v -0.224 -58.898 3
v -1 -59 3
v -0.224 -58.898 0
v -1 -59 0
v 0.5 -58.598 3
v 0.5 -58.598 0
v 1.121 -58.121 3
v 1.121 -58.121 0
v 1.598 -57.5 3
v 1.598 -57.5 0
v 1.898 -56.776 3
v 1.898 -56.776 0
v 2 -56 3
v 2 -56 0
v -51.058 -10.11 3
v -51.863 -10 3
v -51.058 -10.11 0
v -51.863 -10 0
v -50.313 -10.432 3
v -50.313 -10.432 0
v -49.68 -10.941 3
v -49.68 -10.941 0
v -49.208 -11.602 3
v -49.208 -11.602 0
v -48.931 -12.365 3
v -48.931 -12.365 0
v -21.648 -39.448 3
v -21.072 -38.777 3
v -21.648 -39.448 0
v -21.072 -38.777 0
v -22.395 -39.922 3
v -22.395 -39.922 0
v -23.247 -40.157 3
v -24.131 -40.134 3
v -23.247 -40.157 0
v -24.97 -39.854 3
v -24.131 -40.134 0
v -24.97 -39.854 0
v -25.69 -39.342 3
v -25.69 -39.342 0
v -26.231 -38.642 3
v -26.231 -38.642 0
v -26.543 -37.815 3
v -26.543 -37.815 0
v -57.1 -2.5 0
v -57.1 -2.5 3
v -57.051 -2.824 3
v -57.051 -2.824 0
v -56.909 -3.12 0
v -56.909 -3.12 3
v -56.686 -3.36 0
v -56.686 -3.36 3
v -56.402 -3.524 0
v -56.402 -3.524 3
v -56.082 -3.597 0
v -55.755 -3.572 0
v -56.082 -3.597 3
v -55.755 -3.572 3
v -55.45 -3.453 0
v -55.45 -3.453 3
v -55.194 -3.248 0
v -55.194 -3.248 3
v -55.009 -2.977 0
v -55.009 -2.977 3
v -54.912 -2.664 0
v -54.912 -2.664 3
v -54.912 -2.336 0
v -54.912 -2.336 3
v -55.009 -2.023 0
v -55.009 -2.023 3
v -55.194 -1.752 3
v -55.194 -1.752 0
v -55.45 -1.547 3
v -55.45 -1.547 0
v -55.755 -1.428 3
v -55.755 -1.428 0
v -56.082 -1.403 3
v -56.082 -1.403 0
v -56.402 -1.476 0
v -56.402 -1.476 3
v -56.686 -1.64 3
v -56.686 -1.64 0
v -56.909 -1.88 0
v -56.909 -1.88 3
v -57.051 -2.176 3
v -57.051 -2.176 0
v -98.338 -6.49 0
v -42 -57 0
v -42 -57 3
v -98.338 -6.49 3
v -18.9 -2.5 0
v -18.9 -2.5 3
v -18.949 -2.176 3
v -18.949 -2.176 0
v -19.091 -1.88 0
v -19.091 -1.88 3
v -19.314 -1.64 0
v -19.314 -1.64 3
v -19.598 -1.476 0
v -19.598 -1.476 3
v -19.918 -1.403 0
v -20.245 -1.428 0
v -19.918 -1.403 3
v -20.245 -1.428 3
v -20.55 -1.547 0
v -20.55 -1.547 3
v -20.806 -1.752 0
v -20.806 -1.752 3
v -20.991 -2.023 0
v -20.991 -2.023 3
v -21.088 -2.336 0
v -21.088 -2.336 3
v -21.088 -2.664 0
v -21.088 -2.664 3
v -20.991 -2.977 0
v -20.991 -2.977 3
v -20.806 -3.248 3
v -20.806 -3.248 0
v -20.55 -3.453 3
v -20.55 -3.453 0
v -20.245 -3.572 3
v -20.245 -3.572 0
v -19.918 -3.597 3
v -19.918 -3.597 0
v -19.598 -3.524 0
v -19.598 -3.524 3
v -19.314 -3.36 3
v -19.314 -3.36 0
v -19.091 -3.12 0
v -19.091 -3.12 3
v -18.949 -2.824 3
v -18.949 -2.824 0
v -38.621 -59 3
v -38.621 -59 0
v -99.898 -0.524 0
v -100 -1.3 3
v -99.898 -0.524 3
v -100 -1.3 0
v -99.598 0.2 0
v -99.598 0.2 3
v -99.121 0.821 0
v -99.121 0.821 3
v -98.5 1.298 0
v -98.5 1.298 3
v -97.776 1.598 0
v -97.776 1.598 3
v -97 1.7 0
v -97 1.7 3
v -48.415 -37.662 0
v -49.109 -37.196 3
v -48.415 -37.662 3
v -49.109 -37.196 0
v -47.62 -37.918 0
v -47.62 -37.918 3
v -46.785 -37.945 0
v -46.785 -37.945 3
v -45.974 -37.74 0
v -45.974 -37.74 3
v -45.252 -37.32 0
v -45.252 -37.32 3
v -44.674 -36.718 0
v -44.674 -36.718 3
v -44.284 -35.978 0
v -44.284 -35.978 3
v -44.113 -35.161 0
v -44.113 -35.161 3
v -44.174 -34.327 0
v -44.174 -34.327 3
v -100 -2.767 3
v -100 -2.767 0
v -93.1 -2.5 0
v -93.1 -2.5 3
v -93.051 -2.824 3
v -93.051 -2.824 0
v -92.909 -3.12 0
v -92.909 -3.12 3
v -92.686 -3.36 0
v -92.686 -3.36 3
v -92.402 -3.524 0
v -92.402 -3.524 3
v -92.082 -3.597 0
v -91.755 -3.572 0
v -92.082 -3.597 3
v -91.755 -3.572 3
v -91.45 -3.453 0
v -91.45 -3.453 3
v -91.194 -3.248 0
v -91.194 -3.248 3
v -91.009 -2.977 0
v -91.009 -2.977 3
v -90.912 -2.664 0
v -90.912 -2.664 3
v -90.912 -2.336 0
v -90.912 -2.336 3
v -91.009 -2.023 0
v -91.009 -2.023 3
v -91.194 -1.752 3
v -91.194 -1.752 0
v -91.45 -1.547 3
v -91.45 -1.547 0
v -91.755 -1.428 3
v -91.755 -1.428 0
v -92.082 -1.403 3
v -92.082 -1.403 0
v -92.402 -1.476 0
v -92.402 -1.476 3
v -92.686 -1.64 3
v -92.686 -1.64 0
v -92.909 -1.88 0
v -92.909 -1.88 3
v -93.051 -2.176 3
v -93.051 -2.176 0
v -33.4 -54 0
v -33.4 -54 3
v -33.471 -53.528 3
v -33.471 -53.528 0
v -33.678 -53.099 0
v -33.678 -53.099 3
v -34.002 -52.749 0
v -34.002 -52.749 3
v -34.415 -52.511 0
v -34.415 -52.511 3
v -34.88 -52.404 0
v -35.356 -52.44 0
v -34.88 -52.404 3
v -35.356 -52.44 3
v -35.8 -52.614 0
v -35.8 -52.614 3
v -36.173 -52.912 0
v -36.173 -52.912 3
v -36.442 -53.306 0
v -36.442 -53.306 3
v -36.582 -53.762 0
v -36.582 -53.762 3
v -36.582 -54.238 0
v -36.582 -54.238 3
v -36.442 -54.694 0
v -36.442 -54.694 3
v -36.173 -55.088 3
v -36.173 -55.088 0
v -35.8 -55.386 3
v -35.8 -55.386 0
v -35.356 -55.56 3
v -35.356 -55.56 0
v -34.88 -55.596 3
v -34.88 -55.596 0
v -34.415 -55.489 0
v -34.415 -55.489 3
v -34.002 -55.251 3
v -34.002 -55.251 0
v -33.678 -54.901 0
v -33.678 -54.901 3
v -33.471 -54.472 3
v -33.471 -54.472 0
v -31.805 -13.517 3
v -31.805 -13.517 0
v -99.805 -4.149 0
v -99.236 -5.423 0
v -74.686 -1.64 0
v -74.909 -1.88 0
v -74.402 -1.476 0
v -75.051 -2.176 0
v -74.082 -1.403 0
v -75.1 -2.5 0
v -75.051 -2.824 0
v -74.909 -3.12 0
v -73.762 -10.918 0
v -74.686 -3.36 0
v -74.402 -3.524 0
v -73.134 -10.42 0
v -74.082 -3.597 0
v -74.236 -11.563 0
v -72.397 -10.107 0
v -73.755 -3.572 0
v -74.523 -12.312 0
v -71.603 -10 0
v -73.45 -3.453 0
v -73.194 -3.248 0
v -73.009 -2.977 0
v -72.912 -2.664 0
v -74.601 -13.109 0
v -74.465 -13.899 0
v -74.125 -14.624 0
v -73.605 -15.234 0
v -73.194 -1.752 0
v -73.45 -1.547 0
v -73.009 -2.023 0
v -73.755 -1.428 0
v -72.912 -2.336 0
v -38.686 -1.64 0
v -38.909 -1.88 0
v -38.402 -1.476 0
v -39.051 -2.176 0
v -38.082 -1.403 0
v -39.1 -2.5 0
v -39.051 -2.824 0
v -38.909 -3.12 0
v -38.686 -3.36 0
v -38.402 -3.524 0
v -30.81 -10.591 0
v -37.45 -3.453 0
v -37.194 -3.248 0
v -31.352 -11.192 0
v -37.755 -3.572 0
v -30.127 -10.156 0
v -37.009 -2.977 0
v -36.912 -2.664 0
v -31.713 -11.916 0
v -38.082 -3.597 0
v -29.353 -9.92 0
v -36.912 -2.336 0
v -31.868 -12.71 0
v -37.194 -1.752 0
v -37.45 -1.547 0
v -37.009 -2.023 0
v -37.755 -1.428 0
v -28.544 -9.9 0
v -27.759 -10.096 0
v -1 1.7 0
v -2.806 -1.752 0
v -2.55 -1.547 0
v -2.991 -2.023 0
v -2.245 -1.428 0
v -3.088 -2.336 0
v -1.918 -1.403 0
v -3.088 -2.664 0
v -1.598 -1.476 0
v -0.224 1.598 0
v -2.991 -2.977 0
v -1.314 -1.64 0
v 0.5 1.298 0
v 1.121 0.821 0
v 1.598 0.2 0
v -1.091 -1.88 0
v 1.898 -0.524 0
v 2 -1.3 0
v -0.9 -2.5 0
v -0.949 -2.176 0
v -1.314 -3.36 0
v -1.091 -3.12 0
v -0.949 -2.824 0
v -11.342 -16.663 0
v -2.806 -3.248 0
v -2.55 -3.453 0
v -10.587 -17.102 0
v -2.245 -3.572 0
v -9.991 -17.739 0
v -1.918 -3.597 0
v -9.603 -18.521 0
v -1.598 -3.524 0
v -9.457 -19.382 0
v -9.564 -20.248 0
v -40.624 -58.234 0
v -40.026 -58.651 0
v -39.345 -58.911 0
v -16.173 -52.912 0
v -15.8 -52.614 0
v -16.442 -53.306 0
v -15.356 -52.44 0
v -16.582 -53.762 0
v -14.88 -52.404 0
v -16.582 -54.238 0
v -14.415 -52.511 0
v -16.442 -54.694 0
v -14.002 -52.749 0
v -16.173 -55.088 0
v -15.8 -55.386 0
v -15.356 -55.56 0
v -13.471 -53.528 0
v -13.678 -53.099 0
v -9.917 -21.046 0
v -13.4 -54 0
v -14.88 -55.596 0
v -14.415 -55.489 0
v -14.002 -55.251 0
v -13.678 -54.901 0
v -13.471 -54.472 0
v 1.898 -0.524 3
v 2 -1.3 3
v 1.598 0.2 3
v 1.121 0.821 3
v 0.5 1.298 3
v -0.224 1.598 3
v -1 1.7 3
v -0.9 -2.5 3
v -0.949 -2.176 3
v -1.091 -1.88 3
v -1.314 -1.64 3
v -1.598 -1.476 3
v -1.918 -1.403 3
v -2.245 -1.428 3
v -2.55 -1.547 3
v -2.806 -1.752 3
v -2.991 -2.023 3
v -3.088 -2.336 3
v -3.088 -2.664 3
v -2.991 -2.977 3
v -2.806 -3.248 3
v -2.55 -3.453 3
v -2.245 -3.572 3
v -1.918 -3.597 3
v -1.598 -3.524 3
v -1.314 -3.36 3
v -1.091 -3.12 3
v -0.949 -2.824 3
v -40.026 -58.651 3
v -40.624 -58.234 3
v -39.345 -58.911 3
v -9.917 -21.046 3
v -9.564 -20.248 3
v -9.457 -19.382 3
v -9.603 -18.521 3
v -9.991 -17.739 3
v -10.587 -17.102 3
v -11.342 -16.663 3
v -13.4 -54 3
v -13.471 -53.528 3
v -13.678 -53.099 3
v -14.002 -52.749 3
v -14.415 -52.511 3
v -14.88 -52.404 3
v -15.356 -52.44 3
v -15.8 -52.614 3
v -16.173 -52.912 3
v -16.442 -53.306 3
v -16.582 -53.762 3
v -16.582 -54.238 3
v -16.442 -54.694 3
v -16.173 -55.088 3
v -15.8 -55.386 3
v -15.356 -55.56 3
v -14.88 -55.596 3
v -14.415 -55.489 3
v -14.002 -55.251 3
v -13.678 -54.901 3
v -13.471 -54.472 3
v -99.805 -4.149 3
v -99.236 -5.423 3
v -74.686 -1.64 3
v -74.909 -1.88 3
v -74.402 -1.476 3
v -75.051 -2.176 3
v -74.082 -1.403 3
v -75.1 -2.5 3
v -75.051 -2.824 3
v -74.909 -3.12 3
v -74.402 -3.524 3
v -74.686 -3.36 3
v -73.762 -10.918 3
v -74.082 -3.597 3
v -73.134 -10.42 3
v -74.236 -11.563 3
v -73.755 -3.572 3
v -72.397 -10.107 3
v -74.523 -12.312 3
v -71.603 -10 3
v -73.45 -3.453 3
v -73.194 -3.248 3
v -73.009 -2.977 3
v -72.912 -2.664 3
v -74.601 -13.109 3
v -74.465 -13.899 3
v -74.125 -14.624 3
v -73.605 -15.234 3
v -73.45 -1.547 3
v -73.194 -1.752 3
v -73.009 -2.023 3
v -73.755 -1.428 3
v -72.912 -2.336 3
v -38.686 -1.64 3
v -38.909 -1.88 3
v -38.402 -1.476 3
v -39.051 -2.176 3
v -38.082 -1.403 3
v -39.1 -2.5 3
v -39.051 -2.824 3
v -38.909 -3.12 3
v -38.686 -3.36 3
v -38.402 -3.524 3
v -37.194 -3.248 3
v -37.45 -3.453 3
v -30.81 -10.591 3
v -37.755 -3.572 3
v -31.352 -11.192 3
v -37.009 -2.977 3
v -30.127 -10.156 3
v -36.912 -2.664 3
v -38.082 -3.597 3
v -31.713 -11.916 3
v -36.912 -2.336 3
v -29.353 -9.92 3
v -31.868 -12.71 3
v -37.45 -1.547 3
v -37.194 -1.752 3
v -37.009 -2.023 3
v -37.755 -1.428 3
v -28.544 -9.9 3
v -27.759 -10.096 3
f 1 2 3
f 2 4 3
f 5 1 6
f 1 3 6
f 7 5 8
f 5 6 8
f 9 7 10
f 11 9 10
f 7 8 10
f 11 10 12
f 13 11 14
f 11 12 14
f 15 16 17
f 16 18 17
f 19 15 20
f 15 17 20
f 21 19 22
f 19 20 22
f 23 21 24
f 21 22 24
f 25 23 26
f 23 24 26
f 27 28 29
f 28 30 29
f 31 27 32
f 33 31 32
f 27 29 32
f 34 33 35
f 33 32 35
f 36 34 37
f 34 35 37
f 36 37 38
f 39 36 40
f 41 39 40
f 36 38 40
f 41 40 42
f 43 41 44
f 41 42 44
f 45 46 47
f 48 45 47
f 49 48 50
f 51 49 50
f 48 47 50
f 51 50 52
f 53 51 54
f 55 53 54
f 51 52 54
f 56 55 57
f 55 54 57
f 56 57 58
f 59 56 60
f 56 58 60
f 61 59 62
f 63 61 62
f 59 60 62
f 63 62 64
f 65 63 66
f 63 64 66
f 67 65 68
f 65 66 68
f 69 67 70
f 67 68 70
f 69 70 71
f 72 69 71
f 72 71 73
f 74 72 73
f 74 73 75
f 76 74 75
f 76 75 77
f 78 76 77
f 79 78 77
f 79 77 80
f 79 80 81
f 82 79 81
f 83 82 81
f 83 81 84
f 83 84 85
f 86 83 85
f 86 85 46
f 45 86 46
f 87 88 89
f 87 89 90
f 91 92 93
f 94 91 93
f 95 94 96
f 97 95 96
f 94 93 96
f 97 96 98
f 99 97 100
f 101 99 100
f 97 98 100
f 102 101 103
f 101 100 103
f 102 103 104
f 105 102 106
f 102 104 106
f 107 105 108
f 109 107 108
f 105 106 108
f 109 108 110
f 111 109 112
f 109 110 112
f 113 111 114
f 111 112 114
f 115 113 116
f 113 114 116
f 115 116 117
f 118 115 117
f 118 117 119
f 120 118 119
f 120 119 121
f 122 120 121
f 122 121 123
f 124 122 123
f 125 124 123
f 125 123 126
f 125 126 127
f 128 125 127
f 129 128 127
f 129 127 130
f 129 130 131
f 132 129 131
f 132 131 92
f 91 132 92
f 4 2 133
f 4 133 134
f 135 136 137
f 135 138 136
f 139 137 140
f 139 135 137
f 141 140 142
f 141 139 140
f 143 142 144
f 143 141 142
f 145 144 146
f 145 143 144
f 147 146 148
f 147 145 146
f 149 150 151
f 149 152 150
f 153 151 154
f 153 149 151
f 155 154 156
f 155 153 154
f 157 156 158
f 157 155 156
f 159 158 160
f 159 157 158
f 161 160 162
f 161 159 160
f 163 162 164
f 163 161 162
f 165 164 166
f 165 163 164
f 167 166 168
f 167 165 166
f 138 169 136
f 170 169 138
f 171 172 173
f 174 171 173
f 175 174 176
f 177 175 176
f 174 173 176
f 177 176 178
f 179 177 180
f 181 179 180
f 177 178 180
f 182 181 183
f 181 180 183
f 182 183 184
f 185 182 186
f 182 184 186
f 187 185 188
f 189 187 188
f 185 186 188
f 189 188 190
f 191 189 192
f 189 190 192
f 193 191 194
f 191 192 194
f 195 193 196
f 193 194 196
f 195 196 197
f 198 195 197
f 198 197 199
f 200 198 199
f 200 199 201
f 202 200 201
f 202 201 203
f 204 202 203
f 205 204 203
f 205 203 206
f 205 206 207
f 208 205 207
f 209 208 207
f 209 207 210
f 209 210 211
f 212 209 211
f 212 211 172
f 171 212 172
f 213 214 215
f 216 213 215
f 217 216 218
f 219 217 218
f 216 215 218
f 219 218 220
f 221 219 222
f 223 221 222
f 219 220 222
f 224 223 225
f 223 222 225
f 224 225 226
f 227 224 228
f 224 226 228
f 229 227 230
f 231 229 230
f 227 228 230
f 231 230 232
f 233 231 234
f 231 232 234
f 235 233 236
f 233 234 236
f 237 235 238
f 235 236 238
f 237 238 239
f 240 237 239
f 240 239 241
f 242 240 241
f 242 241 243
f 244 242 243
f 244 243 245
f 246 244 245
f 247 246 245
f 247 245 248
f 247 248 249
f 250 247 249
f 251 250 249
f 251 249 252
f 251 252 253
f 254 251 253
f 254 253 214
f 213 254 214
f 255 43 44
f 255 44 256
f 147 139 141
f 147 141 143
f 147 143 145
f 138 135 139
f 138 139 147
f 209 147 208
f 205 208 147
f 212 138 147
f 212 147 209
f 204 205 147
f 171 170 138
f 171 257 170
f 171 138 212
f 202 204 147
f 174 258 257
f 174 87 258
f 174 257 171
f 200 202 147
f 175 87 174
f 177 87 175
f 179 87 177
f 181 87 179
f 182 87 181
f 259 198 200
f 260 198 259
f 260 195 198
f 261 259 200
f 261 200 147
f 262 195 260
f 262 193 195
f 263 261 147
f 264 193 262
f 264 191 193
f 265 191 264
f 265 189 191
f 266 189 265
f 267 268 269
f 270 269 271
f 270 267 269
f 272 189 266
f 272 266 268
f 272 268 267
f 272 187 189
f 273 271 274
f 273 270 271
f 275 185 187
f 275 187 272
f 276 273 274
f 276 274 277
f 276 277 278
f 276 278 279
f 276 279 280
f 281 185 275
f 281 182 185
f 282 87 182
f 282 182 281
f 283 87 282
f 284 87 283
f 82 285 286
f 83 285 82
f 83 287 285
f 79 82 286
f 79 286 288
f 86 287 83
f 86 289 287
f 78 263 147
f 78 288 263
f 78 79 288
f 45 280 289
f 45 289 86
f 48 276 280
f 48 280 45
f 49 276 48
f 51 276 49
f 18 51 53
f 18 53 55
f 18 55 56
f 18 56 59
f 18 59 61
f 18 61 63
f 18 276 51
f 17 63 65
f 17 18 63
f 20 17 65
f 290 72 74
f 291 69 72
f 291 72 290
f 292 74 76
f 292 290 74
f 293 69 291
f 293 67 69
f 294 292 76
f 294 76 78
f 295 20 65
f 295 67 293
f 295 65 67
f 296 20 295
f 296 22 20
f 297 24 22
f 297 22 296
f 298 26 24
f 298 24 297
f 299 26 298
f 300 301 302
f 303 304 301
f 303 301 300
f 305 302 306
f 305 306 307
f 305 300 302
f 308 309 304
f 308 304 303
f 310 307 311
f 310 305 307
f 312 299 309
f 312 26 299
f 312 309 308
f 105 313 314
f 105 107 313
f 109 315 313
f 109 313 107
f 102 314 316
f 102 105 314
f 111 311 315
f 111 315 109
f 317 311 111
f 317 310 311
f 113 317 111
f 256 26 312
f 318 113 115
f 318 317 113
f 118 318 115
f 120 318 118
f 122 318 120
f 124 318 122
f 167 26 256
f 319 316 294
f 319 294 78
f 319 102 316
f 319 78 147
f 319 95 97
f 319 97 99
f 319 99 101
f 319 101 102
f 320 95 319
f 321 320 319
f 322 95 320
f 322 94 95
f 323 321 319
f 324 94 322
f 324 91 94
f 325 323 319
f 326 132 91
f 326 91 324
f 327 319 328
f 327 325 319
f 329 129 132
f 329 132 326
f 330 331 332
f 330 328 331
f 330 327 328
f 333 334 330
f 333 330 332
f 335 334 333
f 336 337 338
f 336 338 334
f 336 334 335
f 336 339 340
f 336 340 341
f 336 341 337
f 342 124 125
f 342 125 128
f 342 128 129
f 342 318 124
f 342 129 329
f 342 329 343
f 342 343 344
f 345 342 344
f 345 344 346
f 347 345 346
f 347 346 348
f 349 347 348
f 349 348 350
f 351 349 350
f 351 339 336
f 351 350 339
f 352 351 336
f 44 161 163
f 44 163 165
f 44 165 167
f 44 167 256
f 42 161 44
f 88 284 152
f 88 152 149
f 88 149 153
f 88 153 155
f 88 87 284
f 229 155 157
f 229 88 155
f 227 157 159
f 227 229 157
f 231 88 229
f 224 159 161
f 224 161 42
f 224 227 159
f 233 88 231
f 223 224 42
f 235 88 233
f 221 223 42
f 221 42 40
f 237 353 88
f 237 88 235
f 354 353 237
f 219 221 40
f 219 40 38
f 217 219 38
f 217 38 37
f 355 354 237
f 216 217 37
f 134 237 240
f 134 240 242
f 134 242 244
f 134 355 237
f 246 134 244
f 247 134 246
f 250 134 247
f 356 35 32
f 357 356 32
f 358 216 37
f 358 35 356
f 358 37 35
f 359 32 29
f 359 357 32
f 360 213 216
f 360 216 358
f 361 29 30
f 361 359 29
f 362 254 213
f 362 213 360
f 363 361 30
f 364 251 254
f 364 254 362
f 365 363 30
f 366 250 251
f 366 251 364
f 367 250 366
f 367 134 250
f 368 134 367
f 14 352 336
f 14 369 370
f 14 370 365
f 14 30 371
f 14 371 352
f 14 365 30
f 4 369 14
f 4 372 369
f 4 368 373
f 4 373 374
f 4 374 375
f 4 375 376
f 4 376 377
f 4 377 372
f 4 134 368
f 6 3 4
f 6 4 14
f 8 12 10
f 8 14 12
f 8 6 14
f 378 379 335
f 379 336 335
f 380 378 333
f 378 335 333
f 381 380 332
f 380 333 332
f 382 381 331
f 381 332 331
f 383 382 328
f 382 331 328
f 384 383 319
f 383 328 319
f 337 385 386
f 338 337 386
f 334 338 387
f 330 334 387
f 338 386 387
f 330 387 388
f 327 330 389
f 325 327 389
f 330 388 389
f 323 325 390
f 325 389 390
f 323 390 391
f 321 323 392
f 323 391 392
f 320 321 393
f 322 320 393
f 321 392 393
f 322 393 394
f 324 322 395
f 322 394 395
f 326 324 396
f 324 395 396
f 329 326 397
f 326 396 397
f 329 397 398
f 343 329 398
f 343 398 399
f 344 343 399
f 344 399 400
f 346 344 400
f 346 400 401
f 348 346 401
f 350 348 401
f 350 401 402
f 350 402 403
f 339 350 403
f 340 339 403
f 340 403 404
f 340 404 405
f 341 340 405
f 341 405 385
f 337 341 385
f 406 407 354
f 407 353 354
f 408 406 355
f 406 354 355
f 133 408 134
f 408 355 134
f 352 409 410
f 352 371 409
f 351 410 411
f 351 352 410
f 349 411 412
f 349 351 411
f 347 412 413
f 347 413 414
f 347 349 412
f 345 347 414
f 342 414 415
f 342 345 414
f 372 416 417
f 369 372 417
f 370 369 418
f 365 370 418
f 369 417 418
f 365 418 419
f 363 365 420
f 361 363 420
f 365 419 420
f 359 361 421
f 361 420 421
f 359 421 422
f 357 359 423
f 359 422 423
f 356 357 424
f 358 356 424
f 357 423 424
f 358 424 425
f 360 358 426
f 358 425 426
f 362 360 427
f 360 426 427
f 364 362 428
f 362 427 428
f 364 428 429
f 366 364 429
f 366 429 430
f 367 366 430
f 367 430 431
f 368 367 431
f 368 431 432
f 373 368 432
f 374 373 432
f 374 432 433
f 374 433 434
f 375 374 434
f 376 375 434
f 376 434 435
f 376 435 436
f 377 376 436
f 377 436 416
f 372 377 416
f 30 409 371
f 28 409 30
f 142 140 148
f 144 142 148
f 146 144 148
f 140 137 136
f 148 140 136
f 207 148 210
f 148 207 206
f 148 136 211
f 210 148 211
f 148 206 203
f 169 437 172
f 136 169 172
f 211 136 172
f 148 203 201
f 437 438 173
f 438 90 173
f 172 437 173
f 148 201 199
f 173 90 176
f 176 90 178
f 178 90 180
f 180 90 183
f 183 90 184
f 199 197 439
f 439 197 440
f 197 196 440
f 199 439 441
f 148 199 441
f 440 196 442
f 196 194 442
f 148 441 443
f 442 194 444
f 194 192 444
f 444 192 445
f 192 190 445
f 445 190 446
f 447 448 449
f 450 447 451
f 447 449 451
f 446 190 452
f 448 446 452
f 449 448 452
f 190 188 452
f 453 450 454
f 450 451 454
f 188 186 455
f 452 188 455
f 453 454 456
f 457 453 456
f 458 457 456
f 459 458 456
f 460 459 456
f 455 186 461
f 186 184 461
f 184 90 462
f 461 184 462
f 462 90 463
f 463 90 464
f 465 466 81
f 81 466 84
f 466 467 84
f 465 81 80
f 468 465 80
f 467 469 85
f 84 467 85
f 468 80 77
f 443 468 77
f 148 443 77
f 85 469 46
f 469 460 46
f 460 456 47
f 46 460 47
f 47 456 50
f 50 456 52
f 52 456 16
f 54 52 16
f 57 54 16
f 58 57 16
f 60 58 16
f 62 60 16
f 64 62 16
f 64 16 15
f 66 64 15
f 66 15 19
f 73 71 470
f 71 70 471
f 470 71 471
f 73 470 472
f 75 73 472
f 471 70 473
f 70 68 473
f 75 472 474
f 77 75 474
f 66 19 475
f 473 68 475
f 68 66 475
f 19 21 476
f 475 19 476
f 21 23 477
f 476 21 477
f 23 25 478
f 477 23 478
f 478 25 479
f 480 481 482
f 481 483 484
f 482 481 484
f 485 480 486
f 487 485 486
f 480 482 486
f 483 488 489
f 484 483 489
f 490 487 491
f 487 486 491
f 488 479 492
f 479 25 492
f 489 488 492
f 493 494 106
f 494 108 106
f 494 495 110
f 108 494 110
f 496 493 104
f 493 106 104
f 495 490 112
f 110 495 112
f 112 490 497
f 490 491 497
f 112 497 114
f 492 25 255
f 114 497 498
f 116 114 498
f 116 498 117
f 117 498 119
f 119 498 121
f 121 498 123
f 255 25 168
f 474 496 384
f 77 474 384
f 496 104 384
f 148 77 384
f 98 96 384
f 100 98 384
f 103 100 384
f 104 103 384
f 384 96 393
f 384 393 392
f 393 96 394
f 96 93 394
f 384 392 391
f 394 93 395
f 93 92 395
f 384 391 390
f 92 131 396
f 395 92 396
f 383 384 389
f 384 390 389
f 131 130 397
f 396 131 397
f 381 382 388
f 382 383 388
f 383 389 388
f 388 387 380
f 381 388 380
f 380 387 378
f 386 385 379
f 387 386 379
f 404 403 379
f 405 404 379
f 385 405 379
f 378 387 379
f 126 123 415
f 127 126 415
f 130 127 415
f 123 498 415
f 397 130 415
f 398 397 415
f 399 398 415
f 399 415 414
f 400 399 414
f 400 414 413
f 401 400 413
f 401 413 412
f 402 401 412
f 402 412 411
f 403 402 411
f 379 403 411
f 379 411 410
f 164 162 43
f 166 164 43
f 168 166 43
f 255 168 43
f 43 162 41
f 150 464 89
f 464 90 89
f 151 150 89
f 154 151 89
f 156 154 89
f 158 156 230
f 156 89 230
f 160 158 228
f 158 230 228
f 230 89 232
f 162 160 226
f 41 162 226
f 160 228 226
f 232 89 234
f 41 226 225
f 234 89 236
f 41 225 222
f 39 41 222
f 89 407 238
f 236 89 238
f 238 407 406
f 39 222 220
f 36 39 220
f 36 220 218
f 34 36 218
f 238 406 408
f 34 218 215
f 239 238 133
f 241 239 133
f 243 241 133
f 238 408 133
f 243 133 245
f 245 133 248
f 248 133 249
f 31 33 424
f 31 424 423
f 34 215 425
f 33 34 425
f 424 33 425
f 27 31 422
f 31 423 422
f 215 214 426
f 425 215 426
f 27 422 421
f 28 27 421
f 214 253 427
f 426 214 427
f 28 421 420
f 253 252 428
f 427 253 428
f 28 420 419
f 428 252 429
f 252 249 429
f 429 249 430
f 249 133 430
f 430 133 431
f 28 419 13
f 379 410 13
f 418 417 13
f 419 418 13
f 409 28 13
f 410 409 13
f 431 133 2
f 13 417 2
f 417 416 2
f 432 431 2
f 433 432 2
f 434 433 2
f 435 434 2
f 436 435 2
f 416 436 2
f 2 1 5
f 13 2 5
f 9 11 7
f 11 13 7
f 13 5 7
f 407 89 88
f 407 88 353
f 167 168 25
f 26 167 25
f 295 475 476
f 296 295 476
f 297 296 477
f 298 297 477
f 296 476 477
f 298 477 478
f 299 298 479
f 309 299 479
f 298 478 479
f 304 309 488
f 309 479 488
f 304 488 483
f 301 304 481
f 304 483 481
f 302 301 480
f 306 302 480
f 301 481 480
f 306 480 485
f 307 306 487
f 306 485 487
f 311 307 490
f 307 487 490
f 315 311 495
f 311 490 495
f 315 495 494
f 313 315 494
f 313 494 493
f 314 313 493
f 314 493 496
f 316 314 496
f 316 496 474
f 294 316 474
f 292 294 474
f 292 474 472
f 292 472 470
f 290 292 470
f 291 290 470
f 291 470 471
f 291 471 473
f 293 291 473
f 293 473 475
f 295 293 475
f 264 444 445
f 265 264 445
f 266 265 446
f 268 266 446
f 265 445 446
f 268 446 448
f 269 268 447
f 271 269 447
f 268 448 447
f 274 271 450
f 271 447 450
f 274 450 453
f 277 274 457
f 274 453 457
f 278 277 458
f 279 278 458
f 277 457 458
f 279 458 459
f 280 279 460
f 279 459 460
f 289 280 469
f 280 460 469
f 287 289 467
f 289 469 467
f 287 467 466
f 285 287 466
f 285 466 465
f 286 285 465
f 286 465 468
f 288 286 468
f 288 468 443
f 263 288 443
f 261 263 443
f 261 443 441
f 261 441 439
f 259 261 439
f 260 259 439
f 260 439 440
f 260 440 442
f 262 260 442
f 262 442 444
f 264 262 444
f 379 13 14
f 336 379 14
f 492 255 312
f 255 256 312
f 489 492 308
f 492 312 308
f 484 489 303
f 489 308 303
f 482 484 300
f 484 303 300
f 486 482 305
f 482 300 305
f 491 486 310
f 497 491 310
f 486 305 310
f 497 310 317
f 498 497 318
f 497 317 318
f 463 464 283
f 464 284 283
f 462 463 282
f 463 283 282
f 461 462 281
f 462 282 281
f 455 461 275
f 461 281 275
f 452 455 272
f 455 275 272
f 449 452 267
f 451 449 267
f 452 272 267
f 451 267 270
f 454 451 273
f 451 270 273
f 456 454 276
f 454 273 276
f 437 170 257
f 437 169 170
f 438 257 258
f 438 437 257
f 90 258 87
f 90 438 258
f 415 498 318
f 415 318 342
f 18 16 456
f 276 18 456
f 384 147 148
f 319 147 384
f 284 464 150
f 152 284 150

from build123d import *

# Parameters (mm, degrees)
EXTRUDE_1_DEPTH     = 3
SKETCH_2_R          = 1.1
SKETCH_2_R_2        = 1.025013192
SKETCH_2_R_3        = 1.6
CUT_EXTRUDE_2_DEPTH = 116.143388868
FILLET_1_R          = 5
SKETCH_3_R          = 1.6
SKETCH_3_R_2        = 1.1
EXTRUDE_2_DEPTH     = 3
CUT_EXTRUDE_3_DEPTH = 10
FILLET_2_R          = 3
EXTRUDE_3_DEPTH     = 3
SKETCH_6_W          = 3
SKETCH_6_H          = 59
EXTRUDE_4_DEPTH     = 2
SKETCH_7_W          = 102
SKETCH_7_H          = 3
EXTRUDE_5_DEPTH     = 1.7
FILLET_4_R          = 3


with BuildPart() as part:
    # 草图1 → 凸台-拉伸1 (new body)
    with BuildSketch(Plane.XY):
        Polygon((0, 0), (0, -57), (-42, -57), (-100, -5), (-100, 0), align=None)
    extrude(amount=EXTRUDE_1_DEPTH)

    # 草图2 → 切除-拉伸2 (cut, through all)
    with BuildSketch(Plane.XY.offset(3)):
        with Locations(Location((-38, -45, 0), (0, 0, 180))):
            Circle(SKETCH_2_R)
        with Locations(Location((-38, -14.5, 0), (0, 0, 180))):
            Circle(SKETCH_2_R)
        with Locations(Location((-38, -2.5, 0), (0, 0, 180))):
            Circle(SKETCH_2_R)
        with Locations(Location((-56, -2.5, 0), (0, 0, 180))):
            Circle(SKETCH_2_R)
        with Locations(Location((-74, -2.5, 0), (0, 0, 180))):
            Circle(SKETCH_2_R)
        with Locations(Location((-92, -2.5, 0), (0, 0, 180))):
            Circle(SKETCH_2_R)
        with Locations((-55.007781707, -42.651734732)):
            Circle(SKETCH_2_R_2)
        with Locations((-81.223203164, -24.300939713)):
            Circle(SKETCH_2_R_2)
        with Locations((-20, -2.5)):
            Circle(SKETCH_2_R)
        with Locations((-2, -2.5)):
            Circle(SKETCH_2_R)
        with Locations((-2, -14.5)):
            Circle(SKETCH_2_R)
        with Locations((-2, -45)):
            Circle(SKETCH_2_R)
        with Locations((-15, -54)):
            Circle(SKETCH_2_R_3)
        with Locations((-35, -54)):
            Circle(SKETCH_2_R_3)
    extrude(amount=-CUT_EXTRUDE_2_DEPTH, mode=Mode.SUBTRACT)

    # 圆角1
    fillet_1_edges = [part.edges().sort_by_distance(p)[0] for p in [
        (-100, -5, 1.5),
    ]]
    fillet(fillet_1_edges, radius=FILLET_1_R)

    # 草图3 → 凸台-拉伸2 (add)
    with BuildSketch(Plane.XY.offset(3)):
        with BuildLine():
            Line((-100, 0), (-100, -2.767468243))
            ThreePointArc((-100, -2.767468243), (-99.565557216, -4.806018538), (-98.337725079, -6.490315447))
            Line((-98.337725079, -6.490315447), (-42, -57))
            Line((-42, -57), (0, -57))
            Line((0, -57), (0, 0))
            Line((0, 0), (-100, 0))
        make_face()
        with Locations((-15, -54)):
            Circle(SKETCH_3_R, mode=Mode.SUBTRACT)
        with Locations((-35, -54)):
            Circle(SKETCH_3_R, mode=Mode.SUBTRACT)
        with Locations((-2, -2.5)):
            Circle(SKETCH_3_R_2, mode=Mode.SUBTRACT)
        with Locations((-20, -2.5)):
            Circle(SKETCH_3_R_2, mode=Mode.SUBTRACT)
        with Locations(Location((-38, -2.5, 0), (0, 0, 180))):
            Circle(SKETCH_3_R_2, mode=Mode.SUBTRACT)
        with Locations(Location((-56, -2.5, 0), (0, 0, 180))):
            Circle(SKETCH_3_R_2, mode=Mode.SUBTRACT)
        with Locations(Location((-74, -2.5, 0), (0, 0, 180))):
            Circle(SKETCH_3_R_2, mode=Mode.SUBTRACT)
        with Locations(Location((-92, -2.5, 0), (0, 0, 180))):
            Circle(SKETCH_3_R_2, mode=Mode.SUBTRACT)
    extrude(amount=-EXTRUDE_2_DEPTH)

    # 草图4 → 切除-拉伸3 (cut)
    with BuildSketch(Plane.XY.offset(3)):
        Polygon((-79.442813774, -10), (-42.214341741, -43.377250788), (-49.442813774, -10), align=None)
        Polygon((-33, -8), (-8, -18), (-24.986953422, -45), align=None)
    extrude(amount=-CUT_EXTRUDE_3_DEPTH, mode=Mode.SUBTRACT)

    # 圆角2
    fillet_2_edges = [part.edges().sort_by_distance(p)[0] for p in [
        (-79.442813774, -10, 1.5),
        (-49.442813774, -10, 1.5),
        (-42.214341741, -43.377250788, 1.5),
        (-24.986953422, -45, 1.5),
        (-33, -8, 1.5),
        (-8, -18, 1.5),
    ]]
    fillet(fillet_2_edges, radius=FILLET_2_R)

    # 草图5 → 凸台-拉伸3 (add)
    with BuildSketch(Plane.XY.offset(3)):
        Polygon((0, -57), (-42, -57), (-39.769230769, -59), (0, -59), align=None)
    extrude(amount=-EXTRUDE_3_DEPTH)

    # 草图6 → 凸台-拉伸4 (add)
    with BuildSketch(Plane(origin=(0, 0, 0), x_dir=(0, 0, -1), z_dir=(1, 0, 0))):
        with Locations((-1.5, -29.5)):
            Rectangle(SKETCH_6_W, SKETCH_6_H)
    extrude(amount=EXTRUDE_4_DEPTH)

    # 草图7 → 凸台-拉伸5 (add)
    with BuildSketch(Plane(origin=(0, 0, 0), x_dir=(1, 0, 0), z_dir=(0, 1, 0))):
        with Locations((-49, -1.5)):
            Rectangle(SKETCH_7_W, SKETCH_7_H)
    extrude(amount=EXTRUDE_5_DEPTH)

    # 圆角4
    fillet_4_edges = [part.edges().sort_by_distance(p)[0] for p in [
        (-39.769230769, -59, 1.5),
        (2, -59, 1.5),
        (2, 1.7, 1.5),
        (-100, 1.7, 1.5),
    ]]
    fillet(fillet_4_edges, radius=FILLET_4_R)


solid = part.part
